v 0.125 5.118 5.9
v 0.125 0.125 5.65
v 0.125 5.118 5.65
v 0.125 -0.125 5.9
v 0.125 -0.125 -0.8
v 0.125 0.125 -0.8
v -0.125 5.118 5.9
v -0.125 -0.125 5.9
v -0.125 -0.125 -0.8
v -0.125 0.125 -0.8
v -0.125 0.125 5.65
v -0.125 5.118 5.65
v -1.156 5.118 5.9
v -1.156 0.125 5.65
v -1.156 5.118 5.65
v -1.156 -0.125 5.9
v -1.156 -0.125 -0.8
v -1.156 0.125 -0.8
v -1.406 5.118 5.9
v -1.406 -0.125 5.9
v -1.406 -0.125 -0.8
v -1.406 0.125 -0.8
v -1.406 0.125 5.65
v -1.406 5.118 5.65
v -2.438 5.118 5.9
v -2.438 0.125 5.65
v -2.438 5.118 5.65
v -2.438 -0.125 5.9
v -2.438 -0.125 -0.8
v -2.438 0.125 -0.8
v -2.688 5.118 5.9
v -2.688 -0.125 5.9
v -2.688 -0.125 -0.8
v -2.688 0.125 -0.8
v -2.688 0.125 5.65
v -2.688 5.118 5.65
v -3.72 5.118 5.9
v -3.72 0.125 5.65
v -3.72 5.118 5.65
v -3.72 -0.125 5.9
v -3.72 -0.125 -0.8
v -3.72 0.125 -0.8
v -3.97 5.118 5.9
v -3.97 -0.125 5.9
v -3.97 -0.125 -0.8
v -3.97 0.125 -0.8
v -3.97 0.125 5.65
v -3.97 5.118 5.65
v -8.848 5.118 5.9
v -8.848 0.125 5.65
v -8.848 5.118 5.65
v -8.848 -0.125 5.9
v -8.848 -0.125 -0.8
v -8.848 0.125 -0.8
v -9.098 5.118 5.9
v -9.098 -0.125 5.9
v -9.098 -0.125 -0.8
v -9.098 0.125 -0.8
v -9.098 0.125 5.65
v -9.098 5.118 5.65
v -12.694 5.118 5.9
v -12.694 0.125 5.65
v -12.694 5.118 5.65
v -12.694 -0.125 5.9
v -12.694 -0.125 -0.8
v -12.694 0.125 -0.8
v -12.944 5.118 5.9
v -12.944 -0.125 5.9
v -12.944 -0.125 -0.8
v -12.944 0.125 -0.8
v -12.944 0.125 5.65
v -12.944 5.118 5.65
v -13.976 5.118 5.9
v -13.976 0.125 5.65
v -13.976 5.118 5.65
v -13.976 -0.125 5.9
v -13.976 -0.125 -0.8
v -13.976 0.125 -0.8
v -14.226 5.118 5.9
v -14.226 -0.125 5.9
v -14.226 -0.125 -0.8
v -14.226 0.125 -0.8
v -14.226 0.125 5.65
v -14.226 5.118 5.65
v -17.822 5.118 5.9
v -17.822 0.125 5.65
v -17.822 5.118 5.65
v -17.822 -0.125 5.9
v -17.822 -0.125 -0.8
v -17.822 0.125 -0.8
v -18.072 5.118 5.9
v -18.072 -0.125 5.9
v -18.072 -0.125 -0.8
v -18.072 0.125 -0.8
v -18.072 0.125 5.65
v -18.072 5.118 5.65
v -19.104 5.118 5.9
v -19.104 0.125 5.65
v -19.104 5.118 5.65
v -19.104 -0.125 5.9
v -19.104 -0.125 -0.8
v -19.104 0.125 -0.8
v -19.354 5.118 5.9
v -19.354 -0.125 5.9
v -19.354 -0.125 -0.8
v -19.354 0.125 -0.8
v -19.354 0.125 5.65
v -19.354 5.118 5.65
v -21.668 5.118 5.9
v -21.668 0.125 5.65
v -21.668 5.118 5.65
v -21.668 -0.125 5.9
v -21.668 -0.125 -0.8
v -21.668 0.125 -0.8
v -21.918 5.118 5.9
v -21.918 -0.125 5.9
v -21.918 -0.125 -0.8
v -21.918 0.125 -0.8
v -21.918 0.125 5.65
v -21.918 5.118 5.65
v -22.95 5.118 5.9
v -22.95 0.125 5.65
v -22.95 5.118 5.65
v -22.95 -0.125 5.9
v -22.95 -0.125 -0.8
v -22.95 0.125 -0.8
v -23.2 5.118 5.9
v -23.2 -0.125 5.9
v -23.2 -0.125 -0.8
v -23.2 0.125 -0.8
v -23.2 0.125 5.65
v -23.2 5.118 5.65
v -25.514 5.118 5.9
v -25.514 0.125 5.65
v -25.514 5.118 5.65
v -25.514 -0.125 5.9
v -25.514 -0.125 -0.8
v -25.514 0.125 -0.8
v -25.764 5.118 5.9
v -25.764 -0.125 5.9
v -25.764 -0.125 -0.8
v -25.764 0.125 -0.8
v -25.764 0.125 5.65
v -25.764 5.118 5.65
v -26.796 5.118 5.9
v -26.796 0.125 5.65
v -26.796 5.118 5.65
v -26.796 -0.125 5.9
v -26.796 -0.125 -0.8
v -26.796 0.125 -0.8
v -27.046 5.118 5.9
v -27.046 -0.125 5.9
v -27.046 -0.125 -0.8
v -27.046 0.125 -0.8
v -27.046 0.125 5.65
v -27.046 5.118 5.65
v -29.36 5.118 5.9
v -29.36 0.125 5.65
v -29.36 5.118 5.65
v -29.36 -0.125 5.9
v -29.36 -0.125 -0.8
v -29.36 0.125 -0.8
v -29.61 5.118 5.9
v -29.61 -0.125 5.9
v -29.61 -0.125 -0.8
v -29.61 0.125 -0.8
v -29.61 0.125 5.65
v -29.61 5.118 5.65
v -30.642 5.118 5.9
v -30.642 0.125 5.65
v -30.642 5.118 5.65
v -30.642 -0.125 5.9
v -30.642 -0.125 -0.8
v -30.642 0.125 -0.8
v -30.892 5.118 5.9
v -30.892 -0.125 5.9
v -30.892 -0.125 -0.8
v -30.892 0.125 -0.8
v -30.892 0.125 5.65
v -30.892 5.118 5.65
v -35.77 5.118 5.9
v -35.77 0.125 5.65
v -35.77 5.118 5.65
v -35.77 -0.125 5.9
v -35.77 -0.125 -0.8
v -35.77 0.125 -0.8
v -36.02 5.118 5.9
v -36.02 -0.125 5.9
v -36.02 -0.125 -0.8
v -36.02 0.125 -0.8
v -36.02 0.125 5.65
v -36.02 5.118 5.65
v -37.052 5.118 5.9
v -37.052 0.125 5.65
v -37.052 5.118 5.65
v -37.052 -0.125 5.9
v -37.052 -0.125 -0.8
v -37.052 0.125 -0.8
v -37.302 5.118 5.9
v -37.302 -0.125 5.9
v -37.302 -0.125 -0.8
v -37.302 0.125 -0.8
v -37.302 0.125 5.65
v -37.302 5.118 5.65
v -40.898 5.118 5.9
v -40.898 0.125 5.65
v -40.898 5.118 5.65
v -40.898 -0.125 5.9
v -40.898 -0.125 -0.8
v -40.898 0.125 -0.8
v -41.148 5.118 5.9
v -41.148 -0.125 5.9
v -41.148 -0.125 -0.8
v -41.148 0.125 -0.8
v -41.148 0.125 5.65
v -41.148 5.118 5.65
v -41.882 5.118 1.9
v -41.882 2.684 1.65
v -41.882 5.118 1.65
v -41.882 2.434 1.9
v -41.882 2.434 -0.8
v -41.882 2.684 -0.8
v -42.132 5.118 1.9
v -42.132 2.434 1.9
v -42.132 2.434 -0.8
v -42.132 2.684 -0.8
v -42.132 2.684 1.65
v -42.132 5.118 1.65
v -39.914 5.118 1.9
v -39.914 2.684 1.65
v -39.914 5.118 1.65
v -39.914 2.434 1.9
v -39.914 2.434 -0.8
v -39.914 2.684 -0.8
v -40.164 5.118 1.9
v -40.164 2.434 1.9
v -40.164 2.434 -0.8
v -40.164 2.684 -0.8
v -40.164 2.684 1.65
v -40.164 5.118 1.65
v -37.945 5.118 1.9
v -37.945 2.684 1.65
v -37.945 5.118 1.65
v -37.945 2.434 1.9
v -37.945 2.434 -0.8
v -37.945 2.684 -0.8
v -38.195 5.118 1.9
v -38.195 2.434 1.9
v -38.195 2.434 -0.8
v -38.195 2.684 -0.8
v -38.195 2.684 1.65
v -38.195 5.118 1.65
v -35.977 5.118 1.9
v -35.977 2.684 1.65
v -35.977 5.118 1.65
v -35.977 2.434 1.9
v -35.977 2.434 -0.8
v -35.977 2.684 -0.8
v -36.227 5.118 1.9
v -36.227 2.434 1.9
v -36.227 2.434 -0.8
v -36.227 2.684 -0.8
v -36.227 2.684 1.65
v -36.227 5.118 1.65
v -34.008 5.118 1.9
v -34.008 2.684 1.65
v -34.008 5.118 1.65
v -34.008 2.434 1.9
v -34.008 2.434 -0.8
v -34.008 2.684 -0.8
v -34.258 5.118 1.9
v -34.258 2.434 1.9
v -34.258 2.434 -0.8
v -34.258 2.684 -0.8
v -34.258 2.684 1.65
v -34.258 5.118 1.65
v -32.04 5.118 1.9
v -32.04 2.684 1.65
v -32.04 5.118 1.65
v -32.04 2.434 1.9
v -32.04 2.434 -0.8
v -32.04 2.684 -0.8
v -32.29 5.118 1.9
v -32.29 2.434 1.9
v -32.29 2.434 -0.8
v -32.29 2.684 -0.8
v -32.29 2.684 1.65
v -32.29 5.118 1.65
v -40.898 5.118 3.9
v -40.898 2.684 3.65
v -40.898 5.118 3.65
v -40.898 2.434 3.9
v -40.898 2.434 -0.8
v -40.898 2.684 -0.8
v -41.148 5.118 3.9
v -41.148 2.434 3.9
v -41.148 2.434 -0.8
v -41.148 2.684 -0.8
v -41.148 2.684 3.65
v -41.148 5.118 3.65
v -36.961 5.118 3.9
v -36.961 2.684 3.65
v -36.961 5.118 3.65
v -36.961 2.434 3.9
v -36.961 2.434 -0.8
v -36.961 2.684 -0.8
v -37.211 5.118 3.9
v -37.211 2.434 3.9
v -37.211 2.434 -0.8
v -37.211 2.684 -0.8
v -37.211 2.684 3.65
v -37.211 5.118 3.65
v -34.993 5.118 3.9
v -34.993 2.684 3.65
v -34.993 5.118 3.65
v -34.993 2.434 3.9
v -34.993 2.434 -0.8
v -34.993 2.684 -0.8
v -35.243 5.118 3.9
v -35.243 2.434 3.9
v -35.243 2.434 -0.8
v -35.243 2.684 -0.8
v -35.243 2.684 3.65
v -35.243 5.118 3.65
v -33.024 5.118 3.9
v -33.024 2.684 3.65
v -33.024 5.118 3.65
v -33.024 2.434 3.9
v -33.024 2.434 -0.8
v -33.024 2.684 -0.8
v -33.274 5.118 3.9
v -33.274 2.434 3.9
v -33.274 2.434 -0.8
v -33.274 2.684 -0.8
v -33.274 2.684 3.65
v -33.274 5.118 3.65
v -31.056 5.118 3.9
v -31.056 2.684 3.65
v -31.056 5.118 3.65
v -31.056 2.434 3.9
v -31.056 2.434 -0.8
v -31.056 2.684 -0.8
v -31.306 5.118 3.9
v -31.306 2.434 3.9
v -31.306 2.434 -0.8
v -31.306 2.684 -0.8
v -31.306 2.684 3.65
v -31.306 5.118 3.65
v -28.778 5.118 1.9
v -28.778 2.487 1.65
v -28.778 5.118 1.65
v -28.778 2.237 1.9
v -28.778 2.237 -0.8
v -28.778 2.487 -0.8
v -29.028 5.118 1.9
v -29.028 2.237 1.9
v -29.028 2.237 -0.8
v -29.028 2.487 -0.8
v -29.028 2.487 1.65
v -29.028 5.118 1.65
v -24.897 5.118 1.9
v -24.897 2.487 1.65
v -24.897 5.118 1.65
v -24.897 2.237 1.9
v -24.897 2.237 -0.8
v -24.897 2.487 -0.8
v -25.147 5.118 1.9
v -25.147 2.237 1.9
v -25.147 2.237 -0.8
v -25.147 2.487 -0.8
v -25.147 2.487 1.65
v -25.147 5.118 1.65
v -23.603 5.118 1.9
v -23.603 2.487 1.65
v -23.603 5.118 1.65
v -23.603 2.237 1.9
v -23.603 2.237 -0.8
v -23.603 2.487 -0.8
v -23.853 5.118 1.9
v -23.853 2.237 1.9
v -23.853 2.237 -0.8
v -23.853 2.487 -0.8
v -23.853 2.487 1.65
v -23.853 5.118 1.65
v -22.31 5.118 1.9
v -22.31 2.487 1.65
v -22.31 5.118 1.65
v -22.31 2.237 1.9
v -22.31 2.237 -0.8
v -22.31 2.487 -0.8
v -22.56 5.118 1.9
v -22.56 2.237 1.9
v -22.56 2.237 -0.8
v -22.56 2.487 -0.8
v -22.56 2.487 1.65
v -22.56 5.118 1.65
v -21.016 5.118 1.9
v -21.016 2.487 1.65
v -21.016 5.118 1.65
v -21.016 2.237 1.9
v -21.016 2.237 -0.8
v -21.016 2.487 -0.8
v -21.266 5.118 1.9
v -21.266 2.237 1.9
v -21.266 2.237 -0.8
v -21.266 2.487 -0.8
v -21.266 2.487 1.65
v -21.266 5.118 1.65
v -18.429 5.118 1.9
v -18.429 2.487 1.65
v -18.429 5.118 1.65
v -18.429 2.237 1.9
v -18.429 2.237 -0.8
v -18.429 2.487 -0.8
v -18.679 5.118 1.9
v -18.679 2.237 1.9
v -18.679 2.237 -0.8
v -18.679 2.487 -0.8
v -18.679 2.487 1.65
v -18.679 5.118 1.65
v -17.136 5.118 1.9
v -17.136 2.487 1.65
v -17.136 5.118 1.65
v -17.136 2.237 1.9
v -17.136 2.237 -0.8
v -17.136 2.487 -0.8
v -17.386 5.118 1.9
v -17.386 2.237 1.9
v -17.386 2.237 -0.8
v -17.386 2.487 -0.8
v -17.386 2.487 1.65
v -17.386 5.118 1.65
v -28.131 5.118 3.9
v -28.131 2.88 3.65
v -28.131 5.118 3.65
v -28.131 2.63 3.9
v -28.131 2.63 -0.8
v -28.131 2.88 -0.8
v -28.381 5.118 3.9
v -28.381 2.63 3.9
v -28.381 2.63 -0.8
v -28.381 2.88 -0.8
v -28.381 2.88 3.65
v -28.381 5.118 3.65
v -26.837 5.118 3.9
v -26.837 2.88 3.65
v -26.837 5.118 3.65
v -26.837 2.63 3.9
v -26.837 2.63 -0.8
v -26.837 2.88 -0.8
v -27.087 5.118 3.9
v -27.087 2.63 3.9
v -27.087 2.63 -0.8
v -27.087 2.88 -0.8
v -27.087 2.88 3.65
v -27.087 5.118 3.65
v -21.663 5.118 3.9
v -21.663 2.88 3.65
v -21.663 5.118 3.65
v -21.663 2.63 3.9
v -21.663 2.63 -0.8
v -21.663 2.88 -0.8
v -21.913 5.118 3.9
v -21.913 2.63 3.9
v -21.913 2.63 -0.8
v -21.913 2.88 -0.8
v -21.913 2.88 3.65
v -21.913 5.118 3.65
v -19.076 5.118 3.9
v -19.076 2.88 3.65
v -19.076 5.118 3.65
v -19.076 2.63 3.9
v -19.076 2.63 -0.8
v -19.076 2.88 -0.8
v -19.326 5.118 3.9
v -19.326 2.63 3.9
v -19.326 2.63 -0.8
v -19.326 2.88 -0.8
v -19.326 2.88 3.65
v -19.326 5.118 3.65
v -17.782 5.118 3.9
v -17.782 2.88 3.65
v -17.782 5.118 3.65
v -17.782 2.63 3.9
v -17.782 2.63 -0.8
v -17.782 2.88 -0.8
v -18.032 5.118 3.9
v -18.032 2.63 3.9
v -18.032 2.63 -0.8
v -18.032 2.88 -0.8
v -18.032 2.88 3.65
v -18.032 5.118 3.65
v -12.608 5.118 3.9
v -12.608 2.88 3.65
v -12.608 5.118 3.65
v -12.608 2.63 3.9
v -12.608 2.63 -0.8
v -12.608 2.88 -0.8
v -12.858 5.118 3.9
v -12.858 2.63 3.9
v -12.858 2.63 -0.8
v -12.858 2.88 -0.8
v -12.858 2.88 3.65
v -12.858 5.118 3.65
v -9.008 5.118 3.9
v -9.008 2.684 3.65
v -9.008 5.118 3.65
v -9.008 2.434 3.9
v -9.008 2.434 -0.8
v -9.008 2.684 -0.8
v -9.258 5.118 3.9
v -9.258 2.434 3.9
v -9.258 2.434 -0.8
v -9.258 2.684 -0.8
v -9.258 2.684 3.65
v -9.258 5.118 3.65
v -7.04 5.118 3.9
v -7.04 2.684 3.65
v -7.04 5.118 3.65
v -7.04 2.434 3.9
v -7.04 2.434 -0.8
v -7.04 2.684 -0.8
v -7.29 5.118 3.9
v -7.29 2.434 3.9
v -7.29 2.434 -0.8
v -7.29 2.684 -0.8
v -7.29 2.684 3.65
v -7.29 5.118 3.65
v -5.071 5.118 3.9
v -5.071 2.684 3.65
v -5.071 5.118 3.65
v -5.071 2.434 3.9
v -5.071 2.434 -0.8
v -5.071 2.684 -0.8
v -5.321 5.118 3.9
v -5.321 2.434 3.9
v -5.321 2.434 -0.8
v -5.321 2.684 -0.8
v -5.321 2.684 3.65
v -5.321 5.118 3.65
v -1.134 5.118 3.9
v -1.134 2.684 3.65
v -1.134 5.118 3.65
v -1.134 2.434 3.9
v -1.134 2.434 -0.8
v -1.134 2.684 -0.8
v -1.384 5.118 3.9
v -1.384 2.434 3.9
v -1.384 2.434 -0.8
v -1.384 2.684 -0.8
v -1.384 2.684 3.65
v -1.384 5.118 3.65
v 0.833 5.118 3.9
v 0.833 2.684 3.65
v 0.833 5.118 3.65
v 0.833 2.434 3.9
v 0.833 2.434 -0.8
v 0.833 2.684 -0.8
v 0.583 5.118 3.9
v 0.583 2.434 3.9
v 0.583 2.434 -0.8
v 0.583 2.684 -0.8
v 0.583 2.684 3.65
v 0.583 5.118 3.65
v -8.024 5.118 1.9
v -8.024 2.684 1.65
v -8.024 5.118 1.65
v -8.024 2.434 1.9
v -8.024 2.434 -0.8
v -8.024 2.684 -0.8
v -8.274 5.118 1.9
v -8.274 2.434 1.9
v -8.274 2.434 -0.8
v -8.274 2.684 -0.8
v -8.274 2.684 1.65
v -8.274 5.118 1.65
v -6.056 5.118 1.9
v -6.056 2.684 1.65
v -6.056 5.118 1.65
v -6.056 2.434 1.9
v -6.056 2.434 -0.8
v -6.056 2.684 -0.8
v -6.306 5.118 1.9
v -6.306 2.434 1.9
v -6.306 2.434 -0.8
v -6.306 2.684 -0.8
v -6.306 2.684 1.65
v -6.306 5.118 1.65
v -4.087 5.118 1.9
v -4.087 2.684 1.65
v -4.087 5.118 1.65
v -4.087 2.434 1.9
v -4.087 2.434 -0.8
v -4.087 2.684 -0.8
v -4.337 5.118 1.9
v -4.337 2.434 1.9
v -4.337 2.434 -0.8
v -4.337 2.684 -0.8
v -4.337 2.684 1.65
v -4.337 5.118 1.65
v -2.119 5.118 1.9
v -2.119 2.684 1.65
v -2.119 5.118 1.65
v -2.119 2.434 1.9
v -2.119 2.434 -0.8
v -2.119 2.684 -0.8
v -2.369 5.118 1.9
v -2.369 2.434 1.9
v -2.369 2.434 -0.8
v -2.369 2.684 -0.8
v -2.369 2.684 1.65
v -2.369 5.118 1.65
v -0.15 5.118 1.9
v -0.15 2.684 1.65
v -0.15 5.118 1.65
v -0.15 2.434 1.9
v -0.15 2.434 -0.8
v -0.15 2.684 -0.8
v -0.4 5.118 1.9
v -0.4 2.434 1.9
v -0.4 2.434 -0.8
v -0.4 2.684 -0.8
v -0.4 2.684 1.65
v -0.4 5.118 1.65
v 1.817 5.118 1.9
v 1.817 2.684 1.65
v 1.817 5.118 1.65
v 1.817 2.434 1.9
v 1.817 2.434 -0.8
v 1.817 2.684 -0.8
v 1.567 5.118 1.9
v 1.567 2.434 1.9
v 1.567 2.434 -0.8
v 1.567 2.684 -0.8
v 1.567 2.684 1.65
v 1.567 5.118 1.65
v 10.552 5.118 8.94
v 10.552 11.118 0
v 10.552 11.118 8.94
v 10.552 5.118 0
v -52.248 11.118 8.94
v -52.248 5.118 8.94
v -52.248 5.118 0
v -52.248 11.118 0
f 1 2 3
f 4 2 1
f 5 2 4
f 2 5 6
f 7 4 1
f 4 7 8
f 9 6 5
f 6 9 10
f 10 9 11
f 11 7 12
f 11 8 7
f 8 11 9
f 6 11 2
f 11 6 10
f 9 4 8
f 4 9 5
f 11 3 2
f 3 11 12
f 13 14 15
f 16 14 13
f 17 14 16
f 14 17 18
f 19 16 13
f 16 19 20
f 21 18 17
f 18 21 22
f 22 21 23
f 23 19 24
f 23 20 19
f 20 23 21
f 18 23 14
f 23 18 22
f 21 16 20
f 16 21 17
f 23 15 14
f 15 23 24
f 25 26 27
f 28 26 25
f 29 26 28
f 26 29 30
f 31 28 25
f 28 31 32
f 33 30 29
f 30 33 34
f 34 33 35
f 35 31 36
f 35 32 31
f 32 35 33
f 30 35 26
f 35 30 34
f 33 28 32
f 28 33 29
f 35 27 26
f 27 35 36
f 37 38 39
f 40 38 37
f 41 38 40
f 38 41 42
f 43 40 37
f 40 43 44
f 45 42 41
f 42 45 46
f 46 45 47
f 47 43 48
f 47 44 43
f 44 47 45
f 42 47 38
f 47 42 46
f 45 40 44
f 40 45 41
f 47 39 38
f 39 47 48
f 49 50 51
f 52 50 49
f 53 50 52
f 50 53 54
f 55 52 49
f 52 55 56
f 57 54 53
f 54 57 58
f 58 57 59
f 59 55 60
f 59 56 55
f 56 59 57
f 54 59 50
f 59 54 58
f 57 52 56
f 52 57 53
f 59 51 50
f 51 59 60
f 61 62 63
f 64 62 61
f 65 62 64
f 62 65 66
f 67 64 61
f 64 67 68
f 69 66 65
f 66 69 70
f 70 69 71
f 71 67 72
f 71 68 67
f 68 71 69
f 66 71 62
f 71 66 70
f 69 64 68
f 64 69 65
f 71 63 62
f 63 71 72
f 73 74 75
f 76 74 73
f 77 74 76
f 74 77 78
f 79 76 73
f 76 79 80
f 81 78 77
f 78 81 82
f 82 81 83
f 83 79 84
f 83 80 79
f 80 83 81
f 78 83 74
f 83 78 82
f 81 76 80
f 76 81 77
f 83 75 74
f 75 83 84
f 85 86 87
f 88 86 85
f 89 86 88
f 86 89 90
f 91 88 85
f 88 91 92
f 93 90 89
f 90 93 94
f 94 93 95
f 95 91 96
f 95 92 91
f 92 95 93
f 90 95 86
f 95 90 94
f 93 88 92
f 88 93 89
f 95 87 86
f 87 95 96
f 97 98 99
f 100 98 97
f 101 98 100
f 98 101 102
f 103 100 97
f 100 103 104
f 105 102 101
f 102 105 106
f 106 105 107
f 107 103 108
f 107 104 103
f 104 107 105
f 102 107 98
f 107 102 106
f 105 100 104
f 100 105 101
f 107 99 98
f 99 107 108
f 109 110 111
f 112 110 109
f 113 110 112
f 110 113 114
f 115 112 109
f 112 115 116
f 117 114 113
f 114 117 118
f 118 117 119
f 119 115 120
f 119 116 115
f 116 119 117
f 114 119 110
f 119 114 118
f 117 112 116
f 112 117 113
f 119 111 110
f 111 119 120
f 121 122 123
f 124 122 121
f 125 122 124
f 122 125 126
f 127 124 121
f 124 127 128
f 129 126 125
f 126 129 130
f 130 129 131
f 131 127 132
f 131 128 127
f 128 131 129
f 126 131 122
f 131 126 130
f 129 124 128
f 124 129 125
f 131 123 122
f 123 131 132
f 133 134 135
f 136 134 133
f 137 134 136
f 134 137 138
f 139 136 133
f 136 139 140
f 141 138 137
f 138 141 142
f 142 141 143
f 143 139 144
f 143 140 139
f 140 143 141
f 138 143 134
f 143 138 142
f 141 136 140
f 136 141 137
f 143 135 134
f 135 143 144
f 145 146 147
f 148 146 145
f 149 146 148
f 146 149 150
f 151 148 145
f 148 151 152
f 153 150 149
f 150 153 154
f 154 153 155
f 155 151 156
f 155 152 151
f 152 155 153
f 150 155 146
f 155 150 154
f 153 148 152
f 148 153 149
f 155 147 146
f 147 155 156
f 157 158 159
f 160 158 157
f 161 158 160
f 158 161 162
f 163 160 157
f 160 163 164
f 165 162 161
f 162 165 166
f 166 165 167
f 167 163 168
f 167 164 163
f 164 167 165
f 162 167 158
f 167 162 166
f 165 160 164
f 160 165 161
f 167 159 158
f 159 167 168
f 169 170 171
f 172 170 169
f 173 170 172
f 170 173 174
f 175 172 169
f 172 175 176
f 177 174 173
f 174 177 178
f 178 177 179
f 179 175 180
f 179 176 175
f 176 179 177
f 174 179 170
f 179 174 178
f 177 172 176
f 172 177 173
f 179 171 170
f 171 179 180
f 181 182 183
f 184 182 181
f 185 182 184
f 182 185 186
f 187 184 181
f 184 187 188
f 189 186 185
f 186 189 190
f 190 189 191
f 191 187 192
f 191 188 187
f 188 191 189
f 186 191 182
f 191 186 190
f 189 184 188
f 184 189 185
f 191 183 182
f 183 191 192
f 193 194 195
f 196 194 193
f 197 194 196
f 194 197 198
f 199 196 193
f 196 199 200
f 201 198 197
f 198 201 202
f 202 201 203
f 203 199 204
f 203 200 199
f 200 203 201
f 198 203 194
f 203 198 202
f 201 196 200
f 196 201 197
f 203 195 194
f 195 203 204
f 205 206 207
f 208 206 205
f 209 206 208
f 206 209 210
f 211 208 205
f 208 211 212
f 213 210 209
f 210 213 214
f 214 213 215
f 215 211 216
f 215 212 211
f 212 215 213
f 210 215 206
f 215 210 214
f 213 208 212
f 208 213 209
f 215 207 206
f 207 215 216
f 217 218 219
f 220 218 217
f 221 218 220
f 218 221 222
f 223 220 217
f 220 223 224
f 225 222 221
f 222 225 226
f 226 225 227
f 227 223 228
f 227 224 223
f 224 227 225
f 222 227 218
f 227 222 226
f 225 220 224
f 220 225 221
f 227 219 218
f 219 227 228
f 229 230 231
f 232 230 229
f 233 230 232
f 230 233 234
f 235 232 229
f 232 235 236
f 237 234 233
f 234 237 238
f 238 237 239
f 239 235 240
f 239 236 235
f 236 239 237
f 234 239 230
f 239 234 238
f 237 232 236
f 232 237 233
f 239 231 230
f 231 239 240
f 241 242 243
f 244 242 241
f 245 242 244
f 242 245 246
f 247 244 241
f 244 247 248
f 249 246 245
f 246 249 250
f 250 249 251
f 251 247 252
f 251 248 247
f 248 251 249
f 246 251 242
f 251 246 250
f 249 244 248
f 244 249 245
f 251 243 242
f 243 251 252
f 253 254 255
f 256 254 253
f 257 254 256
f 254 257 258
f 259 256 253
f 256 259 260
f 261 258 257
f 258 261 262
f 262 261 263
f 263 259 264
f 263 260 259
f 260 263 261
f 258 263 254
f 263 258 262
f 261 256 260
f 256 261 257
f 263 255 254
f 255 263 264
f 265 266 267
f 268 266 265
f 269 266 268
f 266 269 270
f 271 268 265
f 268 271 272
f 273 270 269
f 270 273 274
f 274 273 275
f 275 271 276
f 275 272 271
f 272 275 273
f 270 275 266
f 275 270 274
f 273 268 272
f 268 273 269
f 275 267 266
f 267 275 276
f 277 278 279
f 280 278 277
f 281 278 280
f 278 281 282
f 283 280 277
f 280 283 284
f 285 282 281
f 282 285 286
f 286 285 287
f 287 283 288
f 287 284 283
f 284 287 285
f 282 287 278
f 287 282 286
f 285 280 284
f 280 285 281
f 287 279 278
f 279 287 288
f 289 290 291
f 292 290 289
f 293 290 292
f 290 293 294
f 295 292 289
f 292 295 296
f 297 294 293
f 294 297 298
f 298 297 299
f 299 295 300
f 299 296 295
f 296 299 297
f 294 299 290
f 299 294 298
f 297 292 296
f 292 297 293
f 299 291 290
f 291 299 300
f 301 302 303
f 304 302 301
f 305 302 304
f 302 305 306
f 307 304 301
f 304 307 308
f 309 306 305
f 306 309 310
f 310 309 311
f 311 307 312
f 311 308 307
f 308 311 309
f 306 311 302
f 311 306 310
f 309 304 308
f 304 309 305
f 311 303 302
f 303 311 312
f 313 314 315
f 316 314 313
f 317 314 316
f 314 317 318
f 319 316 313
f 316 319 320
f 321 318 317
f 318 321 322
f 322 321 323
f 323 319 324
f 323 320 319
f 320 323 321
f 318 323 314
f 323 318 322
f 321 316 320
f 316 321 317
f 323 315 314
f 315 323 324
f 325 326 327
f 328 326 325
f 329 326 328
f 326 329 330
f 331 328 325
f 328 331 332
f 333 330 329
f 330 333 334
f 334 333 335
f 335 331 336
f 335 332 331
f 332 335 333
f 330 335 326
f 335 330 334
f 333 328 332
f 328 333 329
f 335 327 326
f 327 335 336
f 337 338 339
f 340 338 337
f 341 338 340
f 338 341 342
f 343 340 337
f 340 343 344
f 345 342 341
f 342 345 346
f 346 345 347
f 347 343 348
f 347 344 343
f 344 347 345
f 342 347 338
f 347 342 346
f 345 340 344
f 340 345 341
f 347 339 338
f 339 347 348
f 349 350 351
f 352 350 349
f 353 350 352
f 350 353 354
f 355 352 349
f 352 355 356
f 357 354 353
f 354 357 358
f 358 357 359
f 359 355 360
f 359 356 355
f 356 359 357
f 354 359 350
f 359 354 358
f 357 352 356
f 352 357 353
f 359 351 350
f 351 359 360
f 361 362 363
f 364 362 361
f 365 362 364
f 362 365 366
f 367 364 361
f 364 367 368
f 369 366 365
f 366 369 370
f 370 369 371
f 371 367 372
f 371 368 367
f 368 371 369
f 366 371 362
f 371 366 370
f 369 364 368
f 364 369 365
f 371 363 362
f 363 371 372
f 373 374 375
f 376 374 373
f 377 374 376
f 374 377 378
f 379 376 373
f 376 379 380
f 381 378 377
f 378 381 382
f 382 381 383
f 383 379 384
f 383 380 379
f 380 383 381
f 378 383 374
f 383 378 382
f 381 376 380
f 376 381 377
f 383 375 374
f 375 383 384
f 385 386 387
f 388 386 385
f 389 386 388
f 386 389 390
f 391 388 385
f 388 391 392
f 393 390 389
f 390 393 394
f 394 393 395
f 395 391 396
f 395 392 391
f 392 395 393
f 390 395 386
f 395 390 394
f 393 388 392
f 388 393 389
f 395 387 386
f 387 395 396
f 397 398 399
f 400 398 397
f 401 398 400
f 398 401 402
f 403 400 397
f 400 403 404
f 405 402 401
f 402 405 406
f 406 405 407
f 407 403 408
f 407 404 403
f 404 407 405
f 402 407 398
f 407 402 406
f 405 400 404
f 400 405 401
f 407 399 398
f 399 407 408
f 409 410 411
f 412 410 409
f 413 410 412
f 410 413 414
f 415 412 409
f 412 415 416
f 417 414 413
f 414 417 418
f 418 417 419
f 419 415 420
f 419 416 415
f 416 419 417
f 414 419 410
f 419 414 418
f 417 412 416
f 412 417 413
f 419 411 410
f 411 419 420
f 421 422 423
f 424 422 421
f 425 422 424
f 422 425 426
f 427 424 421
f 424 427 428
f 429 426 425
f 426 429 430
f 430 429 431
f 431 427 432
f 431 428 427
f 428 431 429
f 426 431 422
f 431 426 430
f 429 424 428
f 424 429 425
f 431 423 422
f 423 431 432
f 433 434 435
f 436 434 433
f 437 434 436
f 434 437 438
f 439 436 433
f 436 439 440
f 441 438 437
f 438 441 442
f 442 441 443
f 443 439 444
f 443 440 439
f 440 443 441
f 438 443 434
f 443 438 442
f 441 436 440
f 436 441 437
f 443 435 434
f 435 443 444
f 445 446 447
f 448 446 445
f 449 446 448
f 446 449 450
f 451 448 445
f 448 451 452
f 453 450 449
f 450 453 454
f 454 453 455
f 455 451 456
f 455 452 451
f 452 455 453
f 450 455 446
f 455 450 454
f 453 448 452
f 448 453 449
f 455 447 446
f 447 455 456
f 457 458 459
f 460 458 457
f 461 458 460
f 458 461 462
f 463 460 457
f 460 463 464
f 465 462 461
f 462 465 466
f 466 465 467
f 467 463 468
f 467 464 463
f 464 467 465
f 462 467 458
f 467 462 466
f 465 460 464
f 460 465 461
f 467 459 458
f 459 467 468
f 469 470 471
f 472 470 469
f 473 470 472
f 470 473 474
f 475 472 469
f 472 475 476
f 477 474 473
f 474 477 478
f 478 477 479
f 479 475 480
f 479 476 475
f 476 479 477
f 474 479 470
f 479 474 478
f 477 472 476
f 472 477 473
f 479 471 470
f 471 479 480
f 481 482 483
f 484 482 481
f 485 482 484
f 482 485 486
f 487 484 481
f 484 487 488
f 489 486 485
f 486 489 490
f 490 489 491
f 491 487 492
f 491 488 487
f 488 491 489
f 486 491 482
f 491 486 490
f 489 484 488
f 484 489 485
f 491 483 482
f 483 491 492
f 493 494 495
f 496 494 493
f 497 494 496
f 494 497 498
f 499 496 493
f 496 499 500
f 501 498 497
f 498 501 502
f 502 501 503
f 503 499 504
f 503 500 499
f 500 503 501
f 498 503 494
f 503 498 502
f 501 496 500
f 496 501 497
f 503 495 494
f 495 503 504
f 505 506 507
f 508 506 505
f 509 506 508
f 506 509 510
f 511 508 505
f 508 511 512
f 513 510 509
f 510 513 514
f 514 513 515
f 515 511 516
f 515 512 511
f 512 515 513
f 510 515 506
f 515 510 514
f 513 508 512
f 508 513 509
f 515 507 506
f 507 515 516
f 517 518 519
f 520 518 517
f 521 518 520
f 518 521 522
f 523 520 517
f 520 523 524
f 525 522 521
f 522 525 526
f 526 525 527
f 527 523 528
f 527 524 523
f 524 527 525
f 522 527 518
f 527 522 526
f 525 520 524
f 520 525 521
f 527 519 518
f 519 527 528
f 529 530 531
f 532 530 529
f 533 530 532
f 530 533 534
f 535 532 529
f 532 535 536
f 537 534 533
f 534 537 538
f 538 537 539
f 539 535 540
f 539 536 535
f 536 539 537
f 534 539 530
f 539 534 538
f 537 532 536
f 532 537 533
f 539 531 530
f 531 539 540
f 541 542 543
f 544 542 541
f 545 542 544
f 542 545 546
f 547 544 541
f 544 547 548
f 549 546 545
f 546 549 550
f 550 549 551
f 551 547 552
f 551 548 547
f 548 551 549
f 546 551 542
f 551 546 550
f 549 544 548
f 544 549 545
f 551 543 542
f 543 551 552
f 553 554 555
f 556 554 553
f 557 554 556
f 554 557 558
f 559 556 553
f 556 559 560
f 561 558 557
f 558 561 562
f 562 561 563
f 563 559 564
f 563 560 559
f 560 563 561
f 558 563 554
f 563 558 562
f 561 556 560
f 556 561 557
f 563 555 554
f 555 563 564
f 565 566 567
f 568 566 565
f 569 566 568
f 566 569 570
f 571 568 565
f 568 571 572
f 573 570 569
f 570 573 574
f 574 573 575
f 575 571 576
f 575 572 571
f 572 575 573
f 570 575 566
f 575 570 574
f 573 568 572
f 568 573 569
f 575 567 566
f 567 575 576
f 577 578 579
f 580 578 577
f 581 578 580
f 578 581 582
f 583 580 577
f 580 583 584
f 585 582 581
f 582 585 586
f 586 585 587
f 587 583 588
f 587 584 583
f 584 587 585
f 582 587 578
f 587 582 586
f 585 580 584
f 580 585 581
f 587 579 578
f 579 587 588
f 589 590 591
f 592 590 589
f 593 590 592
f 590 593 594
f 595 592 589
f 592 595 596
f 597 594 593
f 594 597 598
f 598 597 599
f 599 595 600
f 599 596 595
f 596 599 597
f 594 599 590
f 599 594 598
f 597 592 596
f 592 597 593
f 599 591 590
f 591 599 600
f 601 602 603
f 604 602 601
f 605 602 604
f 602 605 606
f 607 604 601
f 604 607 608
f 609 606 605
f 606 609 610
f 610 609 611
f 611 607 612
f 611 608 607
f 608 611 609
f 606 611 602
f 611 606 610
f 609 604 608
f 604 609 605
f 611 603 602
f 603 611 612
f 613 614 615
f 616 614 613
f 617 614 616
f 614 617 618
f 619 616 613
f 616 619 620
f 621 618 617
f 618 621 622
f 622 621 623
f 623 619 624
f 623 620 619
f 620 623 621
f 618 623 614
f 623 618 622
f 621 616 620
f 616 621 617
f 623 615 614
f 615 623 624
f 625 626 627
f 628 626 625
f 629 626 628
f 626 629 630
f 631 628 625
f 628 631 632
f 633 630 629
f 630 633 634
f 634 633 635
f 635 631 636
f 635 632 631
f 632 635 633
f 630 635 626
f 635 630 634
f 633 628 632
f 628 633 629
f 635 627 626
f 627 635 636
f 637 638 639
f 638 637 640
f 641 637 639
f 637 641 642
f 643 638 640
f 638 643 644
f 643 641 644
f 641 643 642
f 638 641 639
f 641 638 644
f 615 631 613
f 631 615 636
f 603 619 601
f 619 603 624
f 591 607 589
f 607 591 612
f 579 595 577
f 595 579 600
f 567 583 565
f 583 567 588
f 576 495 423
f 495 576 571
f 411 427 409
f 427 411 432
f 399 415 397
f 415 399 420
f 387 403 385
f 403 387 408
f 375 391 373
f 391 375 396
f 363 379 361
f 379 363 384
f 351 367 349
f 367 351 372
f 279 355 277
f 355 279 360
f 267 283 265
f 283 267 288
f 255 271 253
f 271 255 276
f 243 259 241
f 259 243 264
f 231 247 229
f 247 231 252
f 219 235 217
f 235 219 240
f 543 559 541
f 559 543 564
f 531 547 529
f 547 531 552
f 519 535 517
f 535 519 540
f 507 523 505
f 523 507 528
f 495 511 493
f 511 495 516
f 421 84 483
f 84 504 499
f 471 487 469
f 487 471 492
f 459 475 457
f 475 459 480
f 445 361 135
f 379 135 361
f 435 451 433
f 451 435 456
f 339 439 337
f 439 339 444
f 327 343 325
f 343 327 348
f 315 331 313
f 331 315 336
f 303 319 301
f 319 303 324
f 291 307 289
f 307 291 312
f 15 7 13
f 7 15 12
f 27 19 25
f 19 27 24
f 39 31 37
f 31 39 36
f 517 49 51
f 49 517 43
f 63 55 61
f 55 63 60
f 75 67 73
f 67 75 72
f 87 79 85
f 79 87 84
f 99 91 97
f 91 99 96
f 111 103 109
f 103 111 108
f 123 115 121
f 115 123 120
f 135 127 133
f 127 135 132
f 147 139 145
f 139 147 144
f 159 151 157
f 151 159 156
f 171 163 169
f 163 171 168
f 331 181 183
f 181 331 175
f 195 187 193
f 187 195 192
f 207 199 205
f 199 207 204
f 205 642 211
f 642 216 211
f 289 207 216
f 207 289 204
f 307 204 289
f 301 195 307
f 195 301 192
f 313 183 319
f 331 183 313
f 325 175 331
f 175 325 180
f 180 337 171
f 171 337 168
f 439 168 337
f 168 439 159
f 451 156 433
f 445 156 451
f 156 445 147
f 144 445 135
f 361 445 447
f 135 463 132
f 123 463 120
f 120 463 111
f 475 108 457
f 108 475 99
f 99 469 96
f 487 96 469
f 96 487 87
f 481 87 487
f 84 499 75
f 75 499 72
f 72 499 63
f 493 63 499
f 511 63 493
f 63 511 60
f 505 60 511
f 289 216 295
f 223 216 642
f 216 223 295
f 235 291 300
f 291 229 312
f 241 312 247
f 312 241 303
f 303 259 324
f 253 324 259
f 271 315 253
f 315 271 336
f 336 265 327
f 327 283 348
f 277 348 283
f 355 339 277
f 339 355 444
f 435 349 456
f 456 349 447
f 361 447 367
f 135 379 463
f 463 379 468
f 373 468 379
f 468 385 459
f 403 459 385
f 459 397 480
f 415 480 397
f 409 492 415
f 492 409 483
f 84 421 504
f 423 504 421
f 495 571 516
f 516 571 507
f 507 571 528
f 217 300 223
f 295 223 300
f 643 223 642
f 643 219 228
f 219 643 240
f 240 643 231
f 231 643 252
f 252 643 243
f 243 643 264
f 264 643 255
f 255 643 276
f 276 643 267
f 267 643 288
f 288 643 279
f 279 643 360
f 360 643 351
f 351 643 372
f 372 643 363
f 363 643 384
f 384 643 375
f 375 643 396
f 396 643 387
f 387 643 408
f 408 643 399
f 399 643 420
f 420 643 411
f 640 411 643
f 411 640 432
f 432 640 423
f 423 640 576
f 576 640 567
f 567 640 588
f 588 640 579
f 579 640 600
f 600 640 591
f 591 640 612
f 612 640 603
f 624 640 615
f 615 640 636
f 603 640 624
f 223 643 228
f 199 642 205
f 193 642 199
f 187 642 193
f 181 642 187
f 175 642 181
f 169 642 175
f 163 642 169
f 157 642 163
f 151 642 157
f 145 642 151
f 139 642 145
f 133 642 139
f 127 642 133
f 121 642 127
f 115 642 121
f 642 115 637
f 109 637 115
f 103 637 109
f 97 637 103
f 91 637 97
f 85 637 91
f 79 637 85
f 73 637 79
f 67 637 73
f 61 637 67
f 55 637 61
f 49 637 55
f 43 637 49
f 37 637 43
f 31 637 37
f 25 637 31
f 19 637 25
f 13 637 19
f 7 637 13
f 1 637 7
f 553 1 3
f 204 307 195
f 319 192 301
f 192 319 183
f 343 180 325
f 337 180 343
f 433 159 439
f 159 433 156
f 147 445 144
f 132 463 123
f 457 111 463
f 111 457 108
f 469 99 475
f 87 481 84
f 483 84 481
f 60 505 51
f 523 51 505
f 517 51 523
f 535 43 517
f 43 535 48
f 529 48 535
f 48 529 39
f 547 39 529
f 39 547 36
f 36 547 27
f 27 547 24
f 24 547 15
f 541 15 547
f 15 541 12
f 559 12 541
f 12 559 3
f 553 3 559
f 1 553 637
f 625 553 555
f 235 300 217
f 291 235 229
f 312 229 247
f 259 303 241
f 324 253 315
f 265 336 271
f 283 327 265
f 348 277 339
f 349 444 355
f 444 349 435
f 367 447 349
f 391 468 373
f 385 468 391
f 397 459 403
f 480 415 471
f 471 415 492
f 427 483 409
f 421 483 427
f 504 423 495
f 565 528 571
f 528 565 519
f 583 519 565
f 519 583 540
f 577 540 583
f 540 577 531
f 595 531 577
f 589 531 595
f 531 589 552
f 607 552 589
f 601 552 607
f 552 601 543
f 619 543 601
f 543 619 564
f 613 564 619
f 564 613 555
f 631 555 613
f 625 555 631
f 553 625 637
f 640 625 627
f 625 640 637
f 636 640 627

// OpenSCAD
module upper_pin() {
	color([.9,.9,.9]) {
		translate([0,0,2.55]) {
			cube(size = [.25,.25,6.7], center = true);
			translate([0,3.35,3.225]) {
				cube(size = [.25,6.7,.25], center = true);
			}
		}
	}
}
module lower_pin() {
	color([.9,.9,.9]) {
		translate([0,0,.55]) {
			cube(size = [.25,.25,2.7], center = true);
			translate([0,2.35,1.225]) {
				cube(size = [.25,4.7,.25], center = true);
			}
		}
	}
}

module middle_pin() {
	color([.9,.9,.9]) {
		translate([0,0,1.55]) {
			cube(size = [.25,.25,4.7], center = true);
			translate([0,2.35,2.225]) {
				cube(size = [.25,4.7,.25], center = true);
			}
		}
	}
}



translate([0.000000, 0.000000, 0]) { upper_pin(); }
translate([-1.281000, 0.000000, 0]) { upper_pin(); }
translate([-2.563000, 0.000000, 0]) { upper_pin(); }
translate([-3.845000, 0.000000, 0]) { upper_pin(); }
translate([-8.973000, 0.000000, 0]) { upper_pin(); }
translate([-12.819000, 0.000000, 0]) { upper_pin(); }
translate([-14.101000, 0.000000, 0]) { upper_pin(); }
translate([-17.947000, 0.000000, 0]) { upper_pin(); }
translate([-19.229000, 0.000000, 0]) { upper_pin(); }
translate([-21.793000, 0.000000, 0]) { upper_pin(); }
translate([-23.075000, 0.000000, 0]) { upper_pin(); }
translate([-25.639000, 0.000000, 0]) { upper_pin(); }
translate([-26.921000, 0.000000, 0]) { upper_pin(); }
translate([-29.485000, 0.000000, 0]) { upper_pin(); }
translate([-30.767000, 0.000000, 0]) { upper_pin(); }
translate([-35.895000, 0.000000, 0]) { upper_pin(); }
translate([-37.177000, 0.000000, 0]) { upper_pin(); }
translate([-41.023000, 0.000000, 0]) { upper_pin(); }
translate([-42.007000, 2.559000, 0]) { lower_pin(); }
translate([-40.039000, 2.559000, 0]) { lower_pin(); }
translate([-38.070000, 2.559000, 0]) { lower_pin(); }
translate([-36.102000, 2.559000, 0]) { lower_pin(); }
translate([-34.133000, 2.559000, 0]) { lower_pin(); }
translate([-32.165000, 2.559000, 0]) { lower_pin(); }
translate([-41.023000, 2.559000, 0]) { middle_pin(); }
translate([-37.086000, 2.559000, 0]) { middle_pin(); }
translate([-35.118000, 2.559000, 0]) { middle_pin(); }
translate([-33.149000, 2.559000, 0]) { middle_pin(); }
translate([-31.181000, 2.559000, 0]) { middle_pin(); }
translate([-28.903000, 2.362000, 0]) { lower_pin(); }
translate([-25.022000, 2.362000, 0]) { lower_pin(); }
translate([-23.728000, 2.362000, 0]) { lower_pin(); }
translate([-22.435000, 2.362000, 0]) { lower_pin(); }
translate([-21.141000, 2.362000, 0]) { lower_pin(); }
translate([-18.554000, 2.362000, 0]) { lower_pin(); }
translate([-17.261000, 2.362000, 0]) { lower_pin(); }
translate([-28.256000, 2.755000, 0]) { middle_pin(); }
translate([-26.962000, 2.755000, 0]) { middle_pin(); }
translate([-21.788000, 2.755000, 0]) { middle_pin(); }
translate([-19.201000, 2.755000, 0]) { middle_pin(); }
translate([-17.907000, 2.755000, 0]) { middle_pin(); }
translate([-12.733000, 2.755000, 0]) { middle_pin(); }
translate([-9.133000, 2.559000, 0]) { middle_pin(); }
translate([-7.165000, 2.559000, 0]) { middle_pin(); }
translate([-5.196000, 2.559000, 0]) { middle_pin(); }
translate([-1.259000, 2.559000, 0]) { middle_pin(); }
translate([0.708000, 2.559000, 0]) { middle_pin(); }
translate([-8.149000, 2.559000, 0]) { lower_pin(); }
translate([-6.181000, 2.559000, 0]) { lower_pin(); }
translate([-4.212000, 2.559000, 0]) { lower_pin(); }
translate([-2.244000, 2.559000, 0]) { lower_pin(); }
translate([-0.275000, 2.559000, 0]) { lower_pin(); }
translate([1.692000, 2.559000, 0]) { lower_pin(); }



translate([-49.488189, 3.346456, 1.98]) {
translate([-2.76, 1.7716535433, -1.98]) {cube(size = [62.8,6,8.94], center = false);}
	scale([.393700, .393700, .393700]) {
		dxf_linear_extrude(file="motronic88_plastic_piece.dxf",layer="0",height=10,center=true,$fn=100,convexity=10);
	}
}
